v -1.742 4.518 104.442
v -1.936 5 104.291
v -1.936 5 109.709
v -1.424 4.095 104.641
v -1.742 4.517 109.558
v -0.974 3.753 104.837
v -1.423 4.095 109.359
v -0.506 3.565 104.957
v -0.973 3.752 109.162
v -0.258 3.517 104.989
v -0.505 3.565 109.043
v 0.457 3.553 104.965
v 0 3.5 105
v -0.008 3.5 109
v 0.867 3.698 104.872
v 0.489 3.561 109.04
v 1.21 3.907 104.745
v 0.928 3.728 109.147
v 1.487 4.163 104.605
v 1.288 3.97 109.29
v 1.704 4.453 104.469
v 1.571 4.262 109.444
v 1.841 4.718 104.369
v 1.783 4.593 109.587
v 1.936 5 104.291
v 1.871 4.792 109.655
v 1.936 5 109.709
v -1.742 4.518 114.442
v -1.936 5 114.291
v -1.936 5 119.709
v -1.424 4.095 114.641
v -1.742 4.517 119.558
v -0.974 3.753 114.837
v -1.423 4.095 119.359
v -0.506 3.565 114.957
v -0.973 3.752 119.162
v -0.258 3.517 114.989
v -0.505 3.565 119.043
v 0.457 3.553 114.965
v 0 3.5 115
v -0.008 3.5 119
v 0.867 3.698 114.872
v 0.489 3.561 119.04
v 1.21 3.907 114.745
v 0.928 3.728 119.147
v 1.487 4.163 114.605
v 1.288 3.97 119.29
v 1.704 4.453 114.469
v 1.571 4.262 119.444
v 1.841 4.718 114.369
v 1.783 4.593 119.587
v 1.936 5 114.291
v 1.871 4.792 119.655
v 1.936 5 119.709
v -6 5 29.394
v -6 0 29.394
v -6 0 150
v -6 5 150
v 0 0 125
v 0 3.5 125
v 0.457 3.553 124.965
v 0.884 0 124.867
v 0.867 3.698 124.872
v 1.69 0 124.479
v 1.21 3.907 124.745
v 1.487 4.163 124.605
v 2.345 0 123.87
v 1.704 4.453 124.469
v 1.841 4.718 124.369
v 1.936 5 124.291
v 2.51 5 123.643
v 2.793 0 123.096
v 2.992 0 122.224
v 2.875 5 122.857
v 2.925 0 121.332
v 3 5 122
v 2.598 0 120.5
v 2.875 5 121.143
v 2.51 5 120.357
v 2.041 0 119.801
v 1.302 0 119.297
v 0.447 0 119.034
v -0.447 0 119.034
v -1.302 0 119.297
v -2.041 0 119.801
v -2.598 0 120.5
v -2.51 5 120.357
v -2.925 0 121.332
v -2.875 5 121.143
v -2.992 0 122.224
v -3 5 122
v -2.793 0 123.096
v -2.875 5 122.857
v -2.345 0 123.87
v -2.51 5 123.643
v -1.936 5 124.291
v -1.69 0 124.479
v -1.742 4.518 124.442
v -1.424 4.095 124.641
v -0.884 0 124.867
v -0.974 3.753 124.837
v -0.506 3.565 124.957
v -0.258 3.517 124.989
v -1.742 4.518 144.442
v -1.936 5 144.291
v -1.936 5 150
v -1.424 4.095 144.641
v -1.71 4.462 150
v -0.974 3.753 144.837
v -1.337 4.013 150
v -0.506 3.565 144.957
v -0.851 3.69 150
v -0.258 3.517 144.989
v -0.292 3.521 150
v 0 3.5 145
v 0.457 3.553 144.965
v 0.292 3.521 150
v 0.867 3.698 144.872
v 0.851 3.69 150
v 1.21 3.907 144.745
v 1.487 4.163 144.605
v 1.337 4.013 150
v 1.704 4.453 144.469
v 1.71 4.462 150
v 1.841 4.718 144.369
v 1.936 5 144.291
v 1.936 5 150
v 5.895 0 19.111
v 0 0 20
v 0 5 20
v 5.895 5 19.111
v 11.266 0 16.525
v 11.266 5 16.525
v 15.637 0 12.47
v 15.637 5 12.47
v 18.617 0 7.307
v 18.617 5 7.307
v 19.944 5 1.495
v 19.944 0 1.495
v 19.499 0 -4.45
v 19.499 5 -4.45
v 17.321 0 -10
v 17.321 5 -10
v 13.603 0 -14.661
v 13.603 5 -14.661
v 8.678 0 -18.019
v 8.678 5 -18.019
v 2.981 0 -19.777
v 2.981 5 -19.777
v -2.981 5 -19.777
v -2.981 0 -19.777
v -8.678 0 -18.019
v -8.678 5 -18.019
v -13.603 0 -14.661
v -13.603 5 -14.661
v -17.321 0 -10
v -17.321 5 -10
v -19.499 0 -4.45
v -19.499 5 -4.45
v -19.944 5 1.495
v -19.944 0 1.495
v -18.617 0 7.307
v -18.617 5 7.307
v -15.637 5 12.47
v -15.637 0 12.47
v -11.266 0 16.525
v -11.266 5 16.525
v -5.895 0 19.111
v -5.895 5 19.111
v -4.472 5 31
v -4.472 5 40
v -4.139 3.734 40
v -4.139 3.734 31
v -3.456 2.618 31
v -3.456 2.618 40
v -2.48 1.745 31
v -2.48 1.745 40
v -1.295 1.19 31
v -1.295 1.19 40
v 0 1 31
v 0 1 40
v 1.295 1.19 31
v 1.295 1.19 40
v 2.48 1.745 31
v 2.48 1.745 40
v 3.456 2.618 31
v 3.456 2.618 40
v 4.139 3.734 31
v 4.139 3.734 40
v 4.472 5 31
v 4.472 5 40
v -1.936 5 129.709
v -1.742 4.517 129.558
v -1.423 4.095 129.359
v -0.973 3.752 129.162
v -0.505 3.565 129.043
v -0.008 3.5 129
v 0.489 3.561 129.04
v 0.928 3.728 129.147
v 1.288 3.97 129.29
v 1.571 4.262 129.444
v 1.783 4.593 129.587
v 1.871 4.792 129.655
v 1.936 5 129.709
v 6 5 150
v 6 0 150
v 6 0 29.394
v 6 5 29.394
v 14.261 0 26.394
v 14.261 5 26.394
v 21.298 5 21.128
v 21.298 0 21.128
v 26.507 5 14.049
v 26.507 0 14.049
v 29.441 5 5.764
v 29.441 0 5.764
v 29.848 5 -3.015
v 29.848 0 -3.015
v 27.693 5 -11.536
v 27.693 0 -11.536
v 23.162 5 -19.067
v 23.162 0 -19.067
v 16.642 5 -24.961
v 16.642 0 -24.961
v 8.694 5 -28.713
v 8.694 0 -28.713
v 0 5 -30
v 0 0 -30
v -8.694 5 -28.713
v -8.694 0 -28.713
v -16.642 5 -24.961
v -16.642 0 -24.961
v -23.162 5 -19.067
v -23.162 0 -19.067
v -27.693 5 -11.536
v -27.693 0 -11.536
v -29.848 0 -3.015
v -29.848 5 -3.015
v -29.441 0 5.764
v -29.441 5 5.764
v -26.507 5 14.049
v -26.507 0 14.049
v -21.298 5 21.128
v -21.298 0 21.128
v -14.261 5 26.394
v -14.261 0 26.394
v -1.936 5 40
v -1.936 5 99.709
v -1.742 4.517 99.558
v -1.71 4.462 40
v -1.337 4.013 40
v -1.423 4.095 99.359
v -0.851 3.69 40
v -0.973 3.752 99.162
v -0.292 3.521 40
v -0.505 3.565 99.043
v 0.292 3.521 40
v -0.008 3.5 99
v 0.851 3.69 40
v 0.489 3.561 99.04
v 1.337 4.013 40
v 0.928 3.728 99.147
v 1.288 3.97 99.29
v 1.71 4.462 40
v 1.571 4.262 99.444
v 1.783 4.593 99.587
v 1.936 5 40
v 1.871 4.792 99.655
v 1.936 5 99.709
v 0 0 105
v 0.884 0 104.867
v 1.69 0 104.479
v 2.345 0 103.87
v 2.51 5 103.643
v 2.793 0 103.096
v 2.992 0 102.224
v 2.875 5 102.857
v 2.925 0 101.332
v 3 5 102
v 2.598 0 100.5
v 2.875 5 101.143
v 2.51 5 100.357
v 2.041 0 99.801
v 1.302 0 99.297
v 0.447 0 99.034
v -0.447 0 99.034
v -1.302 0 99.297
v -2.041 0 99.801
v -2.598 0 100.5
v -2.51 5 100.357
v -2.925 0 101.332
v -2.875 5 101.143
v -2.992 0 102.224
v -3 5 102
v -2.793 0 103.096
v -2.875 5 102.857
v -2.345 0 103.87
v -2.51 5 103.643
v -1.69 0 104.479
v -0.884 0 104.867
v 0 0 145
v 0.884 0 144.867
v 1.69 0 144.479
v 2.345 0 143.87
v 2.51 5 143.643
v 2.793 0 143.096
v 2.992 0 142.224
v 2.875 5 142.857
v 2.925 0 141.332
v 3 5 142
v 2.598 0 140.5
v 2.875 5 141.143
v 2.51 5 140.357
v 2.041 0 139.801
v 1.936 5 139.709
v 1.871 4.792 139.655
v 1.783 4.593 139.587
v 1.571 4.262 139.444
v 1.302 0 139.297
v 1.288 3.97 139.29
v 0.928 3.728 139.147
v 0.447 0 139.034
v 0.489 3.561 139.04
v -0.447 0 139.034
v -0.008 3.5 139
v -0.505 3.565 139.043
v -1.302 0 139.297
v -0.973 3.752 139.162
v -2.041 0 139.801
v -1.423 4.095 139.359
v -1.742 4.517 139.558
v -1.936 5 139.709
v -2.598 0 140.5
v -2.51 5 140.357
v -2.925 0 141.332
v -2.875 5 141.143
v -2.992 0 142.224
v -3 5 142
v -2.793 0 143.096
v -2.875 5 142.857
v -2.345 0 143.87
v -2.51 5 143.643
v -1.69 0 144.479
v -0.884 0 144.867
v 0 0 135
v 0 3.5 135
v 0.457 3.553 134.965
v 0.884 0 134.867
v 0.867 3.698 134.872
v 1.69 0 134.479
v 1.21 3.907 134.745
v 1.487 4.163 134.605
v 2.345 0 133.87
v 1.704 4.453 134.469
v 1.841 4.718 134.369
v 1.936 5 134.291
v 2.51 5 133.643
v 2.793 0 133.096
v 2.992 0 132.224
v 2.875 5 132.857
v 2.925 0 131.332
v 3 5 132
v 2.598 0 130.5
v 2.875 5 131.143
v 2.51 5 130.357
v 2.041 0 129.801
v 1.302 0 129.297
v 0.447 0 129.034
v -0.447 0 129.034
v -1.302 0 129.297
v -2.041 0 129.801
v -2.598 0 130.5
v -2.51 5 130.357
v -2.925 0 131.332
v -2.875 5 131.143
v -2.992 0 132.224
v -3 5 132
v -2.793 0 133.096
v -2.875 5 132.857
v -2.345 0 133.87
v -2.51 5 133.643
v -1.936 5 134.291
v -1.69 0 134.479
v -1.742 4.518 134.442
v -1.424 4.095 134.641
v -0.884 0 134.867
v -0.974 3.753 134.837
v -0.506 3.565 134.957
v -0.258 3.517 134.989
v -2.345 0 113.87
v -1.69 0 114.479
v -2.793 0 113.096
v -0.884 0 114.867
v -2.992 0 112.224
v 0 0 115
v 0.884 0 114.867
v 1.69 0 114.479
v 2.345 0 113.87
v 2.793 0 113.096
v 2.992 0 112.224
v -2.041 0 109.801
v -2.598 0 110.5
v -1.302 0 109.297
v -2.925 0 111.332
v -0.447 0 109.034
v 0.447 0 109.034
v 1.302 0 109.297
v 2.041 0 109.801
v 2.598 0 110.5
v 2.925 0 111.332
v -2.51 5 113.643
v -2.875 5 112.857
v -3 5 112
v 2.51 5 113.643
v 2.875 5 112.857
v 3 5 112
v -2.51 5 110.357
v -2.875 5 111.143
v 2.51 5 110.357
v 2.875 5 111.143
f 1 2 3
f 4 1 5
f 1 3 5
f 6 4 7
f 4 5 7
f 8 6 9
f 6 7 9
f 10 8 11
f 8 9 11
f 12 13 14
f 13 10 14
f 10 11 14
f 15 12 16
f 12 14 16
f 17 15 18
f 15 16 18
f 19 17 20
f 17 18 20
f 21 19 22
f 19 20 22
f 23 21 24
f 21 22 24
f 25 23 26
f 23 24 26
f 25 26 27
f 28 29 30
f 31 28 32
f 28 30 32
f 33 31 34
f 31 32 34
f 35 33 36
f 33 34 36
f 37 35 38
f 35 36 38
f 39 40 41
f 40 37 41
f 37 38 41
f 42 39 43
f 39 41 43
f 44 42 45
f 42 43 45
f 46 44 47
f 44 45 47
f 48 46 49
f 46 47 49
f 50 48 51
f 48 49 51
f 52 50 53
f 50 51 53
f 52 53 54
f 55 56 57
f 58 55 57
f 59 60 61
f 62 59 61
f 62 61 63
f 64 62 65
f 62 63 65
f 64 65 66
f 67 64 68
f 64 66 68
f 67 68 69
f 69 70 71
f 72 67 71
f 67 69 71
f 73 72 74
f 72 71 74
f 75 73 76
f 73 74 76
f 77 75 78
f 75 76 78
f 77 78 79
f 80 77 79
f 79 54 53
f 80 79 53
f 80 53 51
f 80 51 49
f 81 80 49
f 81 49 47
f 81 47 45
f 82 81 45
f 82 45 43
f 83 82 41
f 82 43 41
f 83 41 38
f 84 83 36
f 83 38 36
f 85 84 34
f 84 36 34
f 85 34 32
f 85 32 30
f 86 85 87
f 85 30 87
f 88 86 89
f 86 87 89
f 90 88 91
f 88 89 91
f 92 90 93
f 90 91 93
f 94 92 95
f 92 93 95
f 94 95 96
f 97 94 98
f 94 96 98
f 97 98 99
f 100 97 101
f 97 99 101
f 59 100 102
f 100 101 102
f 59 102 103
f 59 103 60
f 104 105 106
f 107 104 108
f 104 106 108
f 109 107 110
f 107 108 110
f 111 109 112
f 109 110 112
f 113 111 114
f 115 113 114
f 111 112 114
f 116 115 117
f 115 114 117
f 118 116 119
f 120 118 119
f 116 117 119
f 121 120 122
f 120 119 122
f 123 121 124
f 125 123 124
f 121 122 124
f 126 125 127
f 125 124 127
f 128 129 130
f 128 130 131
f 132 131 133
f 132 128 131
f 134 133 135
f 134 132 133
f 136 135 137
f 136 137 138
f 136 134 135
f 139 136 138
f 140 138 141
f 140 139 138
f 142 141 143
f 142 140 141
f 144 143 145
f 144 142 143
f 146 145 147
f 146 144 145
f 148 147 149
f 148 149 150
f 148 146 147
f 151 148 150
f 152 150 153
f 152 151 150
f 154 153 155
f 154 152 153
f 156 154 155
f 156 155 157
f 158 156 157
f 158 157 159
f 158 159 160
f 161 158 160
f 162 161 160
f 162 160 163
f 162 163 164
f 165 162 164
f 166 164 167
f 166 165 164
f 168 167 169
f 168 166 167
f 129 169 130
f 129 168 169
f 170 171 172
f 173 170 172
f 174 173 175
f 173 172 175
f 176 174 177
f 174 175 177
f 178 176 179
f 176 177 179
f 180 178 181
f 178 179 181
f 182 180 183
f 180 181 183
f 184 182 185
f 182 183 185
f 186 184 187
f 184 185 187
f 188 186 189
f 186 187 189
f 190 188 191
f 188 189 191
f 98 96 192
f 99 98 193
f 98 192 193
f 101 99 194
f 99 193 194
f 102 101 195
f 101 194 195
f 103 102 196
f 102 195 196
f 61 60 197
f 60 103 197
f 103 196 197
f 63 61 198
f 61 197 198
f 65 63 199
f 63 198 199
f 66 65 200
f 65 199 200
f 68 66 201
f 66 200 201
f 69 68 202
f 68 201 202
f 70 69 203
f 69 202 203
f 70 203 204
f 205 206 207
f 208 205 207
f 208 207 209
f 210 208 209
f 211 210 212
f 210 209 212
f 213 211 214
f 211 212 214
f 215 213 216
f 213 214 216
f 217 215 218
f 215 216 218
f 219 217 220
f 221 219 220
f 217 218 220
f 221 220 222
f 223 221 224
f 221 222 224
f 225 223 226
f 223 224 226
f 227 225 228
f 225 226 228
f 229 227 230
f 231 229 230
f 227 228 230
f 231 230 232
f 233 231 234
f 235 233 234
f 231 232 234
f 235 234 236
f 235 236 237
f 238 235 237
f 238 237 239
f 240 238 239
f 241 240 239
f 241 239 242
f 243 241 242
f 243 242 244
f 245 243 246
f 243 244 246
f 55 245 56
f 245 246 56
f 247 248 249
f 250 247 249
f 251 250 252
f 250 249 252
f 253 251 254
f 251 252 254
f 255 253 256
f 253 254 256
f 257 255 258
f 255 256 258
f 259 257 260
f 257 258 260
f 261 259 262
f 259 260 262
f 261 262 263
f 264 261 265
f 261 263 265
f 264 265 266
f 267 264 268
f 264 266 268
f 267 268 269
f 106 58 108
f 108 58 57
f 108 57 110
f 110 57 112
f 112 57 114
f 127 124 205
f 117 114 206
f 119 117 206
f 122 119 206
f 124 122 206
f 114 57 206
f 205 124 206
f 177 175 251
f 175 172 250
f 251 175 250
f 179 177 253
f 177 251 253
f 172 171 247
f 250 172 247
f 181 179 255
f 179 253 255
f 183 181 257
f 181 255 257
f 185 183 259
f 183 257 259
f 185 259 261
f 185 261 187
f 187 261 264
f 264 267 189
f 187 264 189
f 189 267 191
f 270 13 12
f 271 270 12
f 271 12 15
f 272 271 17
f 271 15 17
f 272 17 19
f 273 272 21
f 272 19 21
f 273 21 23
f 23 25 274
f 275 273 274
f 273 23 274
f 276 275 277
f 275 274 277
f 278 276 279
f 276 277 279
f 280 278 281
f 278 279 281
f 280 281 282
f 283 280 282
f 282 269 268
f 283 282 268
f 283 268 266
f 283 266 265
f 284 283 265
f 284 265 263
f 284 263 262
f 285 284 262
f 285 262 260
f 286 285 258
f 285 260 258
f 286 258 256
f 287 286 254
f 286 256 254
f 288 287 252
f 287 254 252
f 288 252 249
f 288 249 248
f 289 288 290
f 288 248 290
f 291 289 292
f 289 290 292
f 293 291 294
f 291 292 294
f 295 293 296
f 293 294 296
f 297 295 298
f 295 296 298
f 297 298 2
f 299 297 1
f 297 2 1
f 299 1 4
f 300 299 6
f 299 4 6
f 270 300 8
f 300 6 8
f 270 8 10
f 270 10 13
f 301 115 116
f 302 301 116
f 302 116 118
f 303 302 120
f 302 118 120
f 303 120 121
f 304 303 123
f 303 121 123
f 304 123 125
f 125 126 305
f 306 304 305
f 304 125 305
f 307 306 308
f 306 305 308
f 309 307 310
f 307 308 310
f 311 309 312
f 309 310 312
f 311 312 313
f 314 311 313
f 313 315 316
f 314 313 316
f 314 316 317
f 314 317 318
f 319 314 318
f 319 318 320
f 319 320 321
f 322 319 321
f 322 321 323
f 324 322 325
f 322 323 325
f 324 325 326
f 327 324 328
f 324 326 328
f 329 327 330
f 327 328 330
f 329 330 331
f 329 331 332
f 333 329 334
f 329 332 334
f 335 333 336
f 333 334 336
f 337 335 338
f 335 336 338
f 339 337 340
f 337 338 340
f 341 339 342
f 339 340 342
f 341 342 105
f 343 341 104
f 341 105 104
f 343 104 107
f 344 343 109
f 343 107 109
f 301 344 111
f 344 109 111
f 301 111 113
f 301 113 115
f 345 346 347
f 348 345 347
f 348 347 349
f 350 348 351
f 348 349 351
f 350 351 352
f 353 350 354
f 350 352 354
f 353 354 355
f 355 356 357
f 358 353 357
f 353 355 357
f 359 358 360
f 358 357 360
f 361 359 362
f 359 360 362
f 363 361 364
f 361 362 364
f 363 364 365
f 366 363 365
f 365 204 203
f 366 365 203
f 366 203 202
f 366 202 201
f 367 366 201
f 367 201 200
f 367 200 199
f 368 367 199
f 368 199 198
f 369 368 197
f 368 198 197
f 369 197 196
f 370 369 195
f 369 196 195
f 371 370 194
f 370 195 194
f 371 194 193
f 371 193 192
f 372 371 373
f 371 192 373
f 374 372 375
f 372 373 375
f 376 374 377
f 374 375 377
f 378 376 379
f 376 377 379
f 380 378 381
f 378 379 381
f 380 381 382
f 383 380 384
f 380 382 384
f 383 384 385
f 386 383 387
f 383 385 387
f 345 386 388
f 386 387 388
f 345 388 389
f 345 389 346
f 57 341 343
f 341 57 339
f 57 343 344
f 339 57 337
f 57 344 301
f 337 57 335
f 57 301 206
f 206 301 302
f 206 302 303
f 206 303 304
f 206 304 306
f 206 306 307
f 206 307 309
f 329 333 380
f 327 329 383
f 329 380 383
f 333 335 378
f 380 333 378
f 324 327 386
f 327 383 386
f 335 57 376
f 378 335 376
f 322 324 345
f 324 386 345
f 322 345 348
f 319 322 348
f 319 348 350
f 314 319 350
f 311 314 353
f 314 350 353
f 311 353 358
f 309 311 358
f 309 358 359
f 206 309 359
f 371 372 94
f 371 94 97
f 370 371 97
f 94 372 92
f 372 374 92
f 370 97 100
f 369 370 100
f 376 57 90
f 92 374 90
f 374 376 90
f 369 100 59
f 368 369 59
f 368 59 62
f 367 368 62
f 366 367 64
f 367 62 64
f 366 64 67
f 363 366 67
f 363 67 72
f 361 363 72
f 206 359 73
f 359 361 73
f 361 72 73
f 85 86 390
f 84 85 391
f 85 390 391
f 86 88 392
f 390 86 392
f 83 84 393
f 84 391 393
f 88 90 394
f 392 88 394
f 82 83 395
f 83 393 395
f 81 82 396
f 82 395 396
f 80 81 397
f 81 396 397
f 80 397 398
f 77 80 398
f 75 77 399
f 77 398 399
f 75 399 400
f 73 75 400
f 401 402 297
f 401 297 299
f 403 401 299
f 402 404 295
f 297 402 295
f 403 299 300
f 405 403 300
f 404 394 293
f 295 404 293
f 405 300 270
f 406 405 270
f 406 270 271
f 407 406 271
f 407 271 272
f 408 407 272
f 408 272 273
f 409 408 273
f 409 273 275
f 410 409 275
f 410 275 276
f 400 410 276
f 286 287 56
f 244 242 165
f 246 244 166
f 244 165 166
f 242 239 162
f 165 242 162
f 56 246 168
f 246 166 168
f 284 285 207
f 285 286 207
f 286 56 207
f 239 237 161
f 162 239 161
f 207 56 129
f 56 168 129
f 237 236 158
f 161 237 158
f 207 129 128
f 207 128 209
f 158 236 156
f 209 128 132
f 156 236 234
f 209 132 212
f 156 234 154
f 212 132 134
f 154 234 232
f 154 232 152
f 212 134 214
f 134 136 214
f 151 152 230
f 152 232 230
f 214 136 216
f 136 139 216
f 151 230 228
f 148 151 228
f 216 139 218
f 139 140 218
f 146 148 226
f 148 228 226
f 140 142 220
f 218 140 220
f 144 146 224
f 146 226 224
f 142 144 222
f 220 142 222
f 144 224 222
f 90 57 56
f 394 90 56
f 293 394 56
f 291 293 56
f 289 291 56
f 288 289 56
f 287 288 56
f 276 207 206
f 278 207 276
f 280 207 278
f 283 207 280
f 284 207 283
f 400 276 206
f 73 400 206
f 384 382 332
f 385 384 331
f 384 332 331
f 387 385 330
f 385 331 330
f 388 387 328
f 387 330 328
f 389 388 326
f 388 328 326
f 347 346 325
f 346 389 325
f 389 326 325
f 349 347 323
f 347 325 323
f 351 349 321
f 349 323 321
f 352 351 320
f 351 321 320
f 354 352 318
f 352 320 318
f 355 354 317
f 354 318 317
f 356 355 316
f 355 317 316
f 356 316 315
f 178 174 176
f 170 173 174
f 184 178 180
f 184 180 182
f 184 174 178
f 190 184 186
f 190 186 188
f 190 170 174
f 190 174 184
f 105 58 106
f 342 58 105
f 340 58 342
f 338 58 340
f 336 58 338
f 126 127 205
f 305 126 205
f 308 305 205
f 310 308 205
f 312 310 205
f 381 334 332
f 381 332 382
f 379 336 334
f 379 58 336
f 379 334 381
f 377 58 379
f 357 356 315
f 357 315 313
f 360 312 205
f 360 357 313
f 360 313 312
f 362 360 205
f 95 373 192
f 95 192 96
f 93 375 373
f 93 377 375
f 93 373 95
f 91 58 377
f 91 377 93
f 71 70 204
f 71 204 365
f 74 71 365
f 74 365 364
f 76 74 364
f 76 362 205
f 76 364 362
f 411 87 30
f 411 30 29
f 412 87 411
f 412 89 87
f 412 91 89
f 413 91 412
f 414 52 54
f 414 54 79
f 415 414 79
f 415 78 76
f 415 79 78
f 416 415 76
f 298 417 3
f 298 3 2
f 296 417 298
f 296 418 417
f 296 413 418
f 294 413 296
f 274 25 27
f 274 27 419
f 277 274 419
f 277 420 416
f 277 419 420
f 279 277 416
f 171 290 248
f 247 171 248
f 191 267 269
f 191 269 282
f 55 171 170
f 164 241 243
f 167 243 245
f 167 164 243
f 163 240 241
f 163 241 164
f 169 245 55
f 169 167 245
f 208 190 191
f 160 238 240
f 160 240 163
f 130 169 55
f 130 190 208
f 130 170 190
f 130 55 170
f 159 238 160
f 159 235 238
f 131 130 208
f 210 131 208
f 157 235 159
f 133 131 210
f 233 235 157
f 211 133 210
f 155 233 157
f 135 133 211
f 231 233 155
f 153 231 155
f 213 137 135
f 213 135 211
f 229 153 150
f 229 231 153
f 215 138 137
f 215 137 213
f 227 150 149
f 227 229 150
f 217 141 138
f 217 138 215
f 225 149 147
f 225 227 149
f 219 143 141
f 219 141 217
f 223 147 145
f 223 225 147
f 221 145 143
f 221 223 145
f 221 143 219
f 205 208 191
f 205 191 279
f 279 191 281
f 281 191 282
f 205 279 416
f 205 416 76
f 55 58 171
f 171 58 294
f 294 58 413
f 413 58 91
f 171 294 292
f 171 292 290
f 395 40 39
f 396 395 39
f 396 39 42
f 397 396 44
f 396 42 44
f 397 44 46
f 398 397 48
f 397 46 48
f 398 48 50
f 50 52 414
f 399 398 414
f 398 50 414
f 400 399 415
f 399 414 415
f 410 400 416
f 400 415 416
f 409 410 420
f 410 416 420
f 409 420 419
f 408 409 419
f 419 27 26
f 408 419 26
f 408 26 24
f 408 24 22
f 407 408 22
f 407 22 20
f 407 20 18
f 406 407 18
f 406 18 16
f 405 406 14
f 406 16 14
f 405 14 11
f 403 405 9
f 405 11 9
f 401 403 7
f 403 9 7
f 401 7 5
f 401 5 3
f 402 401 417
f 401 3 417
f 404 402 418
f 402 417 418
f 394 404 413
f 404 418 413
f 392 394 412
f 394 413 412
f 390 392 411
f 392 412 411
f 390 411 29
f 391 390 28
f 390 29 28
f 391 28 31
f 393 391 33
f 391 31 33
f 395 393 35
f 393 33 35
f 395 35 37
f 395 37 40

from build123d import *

# Parameters (mm, degrees)
SKETCH1_R           = 20
BOSS_EXTRUDE1_DEPTH = 5
SKETCH2_R           = 3
CUT_EXTRUDE1_DEPTH  = 10
LPATTERN1_COUNT     = 5
LPATTERN1_PITCH     = 10
SKETCH3_R           = 2
CUT_EXTRUDE2_DEPTH  = 116
CUT_EXTRUDE3_START  = -110
SKETCH4_R           = 4.5
CUT_EXTRUDE3_DEPTH  = 9


with BuildPart() as part:
    # Sketch1 → Boss-Extrude1 (new body)
    with BuildSketch(Plane(origin=(0, 0, 0), x_dir=(1, 0, 0), z_dir=(0, 1, 0))):
        with BuildLine():
            Line((-6, -29.393876913), (-6, -150))
            Line((-6, -150), (6, -150))
            Line((6, -150), (6, -29.393876913))
            ThreePointArc((6, -29.393876913), (0, 30), (-6, -29.393876913))
        make_face()
        with Locations(Location((0, 0, 0), (0, 0, 270))):
            Circle(SKETCH1_R, mode=Mode.SUBTRACT)
    extrude(amount=BOSS_EXTRUDE1_DEPTH)

    # Sketch2 → Cut-Extrude1 (cut)
    with BuildSketch(Plane(origin=(0, 5, 0), x_dir=(1, 0, 0), z_dir=(0, 1, 0))):
        with Locations(Location((0, -142, 0), (0, 0, 270))):
            Circle(SKETCH2_R)
    cut_extrude1 = extrude(amount=-CUT_EXTRUDE1_DEPTH, mode=Mode.SUBTRACT)

    # LPattern1: Cut-Extrude1 ×5
    with Locations(*[(0, 0, -i * LPATTERN1_PITCH) for i in range(1, LPATTERN1_COUNT)]):
        add(cut_extrude1, mode=Mode.SUBTRACT)

    # Sketch3 → Cut-Extrude2 (cut)
    with BuildSketch(Plane.XY.offset(150)):
        with Locations((0, 5.5)):
            Circle(SKETCH3_R)
    extrude(amount=-CUT_EXTRUDE2_DEPTH, mode=Mode.SUBTRACT)

    # Sketch4 → Cut-Extrude3 (cut)
    with BuildSketch(Plane.XY.offset(150).offset(CUT_EXTRUDE3_START)):
        with Locations((0, 5.5)):
            Circle(SKETCH4_R)
    extrude(amount=-CUT_EXTRUDE3_DEPTH, mode=Mode.SUBTRACT)


solid = part.part
